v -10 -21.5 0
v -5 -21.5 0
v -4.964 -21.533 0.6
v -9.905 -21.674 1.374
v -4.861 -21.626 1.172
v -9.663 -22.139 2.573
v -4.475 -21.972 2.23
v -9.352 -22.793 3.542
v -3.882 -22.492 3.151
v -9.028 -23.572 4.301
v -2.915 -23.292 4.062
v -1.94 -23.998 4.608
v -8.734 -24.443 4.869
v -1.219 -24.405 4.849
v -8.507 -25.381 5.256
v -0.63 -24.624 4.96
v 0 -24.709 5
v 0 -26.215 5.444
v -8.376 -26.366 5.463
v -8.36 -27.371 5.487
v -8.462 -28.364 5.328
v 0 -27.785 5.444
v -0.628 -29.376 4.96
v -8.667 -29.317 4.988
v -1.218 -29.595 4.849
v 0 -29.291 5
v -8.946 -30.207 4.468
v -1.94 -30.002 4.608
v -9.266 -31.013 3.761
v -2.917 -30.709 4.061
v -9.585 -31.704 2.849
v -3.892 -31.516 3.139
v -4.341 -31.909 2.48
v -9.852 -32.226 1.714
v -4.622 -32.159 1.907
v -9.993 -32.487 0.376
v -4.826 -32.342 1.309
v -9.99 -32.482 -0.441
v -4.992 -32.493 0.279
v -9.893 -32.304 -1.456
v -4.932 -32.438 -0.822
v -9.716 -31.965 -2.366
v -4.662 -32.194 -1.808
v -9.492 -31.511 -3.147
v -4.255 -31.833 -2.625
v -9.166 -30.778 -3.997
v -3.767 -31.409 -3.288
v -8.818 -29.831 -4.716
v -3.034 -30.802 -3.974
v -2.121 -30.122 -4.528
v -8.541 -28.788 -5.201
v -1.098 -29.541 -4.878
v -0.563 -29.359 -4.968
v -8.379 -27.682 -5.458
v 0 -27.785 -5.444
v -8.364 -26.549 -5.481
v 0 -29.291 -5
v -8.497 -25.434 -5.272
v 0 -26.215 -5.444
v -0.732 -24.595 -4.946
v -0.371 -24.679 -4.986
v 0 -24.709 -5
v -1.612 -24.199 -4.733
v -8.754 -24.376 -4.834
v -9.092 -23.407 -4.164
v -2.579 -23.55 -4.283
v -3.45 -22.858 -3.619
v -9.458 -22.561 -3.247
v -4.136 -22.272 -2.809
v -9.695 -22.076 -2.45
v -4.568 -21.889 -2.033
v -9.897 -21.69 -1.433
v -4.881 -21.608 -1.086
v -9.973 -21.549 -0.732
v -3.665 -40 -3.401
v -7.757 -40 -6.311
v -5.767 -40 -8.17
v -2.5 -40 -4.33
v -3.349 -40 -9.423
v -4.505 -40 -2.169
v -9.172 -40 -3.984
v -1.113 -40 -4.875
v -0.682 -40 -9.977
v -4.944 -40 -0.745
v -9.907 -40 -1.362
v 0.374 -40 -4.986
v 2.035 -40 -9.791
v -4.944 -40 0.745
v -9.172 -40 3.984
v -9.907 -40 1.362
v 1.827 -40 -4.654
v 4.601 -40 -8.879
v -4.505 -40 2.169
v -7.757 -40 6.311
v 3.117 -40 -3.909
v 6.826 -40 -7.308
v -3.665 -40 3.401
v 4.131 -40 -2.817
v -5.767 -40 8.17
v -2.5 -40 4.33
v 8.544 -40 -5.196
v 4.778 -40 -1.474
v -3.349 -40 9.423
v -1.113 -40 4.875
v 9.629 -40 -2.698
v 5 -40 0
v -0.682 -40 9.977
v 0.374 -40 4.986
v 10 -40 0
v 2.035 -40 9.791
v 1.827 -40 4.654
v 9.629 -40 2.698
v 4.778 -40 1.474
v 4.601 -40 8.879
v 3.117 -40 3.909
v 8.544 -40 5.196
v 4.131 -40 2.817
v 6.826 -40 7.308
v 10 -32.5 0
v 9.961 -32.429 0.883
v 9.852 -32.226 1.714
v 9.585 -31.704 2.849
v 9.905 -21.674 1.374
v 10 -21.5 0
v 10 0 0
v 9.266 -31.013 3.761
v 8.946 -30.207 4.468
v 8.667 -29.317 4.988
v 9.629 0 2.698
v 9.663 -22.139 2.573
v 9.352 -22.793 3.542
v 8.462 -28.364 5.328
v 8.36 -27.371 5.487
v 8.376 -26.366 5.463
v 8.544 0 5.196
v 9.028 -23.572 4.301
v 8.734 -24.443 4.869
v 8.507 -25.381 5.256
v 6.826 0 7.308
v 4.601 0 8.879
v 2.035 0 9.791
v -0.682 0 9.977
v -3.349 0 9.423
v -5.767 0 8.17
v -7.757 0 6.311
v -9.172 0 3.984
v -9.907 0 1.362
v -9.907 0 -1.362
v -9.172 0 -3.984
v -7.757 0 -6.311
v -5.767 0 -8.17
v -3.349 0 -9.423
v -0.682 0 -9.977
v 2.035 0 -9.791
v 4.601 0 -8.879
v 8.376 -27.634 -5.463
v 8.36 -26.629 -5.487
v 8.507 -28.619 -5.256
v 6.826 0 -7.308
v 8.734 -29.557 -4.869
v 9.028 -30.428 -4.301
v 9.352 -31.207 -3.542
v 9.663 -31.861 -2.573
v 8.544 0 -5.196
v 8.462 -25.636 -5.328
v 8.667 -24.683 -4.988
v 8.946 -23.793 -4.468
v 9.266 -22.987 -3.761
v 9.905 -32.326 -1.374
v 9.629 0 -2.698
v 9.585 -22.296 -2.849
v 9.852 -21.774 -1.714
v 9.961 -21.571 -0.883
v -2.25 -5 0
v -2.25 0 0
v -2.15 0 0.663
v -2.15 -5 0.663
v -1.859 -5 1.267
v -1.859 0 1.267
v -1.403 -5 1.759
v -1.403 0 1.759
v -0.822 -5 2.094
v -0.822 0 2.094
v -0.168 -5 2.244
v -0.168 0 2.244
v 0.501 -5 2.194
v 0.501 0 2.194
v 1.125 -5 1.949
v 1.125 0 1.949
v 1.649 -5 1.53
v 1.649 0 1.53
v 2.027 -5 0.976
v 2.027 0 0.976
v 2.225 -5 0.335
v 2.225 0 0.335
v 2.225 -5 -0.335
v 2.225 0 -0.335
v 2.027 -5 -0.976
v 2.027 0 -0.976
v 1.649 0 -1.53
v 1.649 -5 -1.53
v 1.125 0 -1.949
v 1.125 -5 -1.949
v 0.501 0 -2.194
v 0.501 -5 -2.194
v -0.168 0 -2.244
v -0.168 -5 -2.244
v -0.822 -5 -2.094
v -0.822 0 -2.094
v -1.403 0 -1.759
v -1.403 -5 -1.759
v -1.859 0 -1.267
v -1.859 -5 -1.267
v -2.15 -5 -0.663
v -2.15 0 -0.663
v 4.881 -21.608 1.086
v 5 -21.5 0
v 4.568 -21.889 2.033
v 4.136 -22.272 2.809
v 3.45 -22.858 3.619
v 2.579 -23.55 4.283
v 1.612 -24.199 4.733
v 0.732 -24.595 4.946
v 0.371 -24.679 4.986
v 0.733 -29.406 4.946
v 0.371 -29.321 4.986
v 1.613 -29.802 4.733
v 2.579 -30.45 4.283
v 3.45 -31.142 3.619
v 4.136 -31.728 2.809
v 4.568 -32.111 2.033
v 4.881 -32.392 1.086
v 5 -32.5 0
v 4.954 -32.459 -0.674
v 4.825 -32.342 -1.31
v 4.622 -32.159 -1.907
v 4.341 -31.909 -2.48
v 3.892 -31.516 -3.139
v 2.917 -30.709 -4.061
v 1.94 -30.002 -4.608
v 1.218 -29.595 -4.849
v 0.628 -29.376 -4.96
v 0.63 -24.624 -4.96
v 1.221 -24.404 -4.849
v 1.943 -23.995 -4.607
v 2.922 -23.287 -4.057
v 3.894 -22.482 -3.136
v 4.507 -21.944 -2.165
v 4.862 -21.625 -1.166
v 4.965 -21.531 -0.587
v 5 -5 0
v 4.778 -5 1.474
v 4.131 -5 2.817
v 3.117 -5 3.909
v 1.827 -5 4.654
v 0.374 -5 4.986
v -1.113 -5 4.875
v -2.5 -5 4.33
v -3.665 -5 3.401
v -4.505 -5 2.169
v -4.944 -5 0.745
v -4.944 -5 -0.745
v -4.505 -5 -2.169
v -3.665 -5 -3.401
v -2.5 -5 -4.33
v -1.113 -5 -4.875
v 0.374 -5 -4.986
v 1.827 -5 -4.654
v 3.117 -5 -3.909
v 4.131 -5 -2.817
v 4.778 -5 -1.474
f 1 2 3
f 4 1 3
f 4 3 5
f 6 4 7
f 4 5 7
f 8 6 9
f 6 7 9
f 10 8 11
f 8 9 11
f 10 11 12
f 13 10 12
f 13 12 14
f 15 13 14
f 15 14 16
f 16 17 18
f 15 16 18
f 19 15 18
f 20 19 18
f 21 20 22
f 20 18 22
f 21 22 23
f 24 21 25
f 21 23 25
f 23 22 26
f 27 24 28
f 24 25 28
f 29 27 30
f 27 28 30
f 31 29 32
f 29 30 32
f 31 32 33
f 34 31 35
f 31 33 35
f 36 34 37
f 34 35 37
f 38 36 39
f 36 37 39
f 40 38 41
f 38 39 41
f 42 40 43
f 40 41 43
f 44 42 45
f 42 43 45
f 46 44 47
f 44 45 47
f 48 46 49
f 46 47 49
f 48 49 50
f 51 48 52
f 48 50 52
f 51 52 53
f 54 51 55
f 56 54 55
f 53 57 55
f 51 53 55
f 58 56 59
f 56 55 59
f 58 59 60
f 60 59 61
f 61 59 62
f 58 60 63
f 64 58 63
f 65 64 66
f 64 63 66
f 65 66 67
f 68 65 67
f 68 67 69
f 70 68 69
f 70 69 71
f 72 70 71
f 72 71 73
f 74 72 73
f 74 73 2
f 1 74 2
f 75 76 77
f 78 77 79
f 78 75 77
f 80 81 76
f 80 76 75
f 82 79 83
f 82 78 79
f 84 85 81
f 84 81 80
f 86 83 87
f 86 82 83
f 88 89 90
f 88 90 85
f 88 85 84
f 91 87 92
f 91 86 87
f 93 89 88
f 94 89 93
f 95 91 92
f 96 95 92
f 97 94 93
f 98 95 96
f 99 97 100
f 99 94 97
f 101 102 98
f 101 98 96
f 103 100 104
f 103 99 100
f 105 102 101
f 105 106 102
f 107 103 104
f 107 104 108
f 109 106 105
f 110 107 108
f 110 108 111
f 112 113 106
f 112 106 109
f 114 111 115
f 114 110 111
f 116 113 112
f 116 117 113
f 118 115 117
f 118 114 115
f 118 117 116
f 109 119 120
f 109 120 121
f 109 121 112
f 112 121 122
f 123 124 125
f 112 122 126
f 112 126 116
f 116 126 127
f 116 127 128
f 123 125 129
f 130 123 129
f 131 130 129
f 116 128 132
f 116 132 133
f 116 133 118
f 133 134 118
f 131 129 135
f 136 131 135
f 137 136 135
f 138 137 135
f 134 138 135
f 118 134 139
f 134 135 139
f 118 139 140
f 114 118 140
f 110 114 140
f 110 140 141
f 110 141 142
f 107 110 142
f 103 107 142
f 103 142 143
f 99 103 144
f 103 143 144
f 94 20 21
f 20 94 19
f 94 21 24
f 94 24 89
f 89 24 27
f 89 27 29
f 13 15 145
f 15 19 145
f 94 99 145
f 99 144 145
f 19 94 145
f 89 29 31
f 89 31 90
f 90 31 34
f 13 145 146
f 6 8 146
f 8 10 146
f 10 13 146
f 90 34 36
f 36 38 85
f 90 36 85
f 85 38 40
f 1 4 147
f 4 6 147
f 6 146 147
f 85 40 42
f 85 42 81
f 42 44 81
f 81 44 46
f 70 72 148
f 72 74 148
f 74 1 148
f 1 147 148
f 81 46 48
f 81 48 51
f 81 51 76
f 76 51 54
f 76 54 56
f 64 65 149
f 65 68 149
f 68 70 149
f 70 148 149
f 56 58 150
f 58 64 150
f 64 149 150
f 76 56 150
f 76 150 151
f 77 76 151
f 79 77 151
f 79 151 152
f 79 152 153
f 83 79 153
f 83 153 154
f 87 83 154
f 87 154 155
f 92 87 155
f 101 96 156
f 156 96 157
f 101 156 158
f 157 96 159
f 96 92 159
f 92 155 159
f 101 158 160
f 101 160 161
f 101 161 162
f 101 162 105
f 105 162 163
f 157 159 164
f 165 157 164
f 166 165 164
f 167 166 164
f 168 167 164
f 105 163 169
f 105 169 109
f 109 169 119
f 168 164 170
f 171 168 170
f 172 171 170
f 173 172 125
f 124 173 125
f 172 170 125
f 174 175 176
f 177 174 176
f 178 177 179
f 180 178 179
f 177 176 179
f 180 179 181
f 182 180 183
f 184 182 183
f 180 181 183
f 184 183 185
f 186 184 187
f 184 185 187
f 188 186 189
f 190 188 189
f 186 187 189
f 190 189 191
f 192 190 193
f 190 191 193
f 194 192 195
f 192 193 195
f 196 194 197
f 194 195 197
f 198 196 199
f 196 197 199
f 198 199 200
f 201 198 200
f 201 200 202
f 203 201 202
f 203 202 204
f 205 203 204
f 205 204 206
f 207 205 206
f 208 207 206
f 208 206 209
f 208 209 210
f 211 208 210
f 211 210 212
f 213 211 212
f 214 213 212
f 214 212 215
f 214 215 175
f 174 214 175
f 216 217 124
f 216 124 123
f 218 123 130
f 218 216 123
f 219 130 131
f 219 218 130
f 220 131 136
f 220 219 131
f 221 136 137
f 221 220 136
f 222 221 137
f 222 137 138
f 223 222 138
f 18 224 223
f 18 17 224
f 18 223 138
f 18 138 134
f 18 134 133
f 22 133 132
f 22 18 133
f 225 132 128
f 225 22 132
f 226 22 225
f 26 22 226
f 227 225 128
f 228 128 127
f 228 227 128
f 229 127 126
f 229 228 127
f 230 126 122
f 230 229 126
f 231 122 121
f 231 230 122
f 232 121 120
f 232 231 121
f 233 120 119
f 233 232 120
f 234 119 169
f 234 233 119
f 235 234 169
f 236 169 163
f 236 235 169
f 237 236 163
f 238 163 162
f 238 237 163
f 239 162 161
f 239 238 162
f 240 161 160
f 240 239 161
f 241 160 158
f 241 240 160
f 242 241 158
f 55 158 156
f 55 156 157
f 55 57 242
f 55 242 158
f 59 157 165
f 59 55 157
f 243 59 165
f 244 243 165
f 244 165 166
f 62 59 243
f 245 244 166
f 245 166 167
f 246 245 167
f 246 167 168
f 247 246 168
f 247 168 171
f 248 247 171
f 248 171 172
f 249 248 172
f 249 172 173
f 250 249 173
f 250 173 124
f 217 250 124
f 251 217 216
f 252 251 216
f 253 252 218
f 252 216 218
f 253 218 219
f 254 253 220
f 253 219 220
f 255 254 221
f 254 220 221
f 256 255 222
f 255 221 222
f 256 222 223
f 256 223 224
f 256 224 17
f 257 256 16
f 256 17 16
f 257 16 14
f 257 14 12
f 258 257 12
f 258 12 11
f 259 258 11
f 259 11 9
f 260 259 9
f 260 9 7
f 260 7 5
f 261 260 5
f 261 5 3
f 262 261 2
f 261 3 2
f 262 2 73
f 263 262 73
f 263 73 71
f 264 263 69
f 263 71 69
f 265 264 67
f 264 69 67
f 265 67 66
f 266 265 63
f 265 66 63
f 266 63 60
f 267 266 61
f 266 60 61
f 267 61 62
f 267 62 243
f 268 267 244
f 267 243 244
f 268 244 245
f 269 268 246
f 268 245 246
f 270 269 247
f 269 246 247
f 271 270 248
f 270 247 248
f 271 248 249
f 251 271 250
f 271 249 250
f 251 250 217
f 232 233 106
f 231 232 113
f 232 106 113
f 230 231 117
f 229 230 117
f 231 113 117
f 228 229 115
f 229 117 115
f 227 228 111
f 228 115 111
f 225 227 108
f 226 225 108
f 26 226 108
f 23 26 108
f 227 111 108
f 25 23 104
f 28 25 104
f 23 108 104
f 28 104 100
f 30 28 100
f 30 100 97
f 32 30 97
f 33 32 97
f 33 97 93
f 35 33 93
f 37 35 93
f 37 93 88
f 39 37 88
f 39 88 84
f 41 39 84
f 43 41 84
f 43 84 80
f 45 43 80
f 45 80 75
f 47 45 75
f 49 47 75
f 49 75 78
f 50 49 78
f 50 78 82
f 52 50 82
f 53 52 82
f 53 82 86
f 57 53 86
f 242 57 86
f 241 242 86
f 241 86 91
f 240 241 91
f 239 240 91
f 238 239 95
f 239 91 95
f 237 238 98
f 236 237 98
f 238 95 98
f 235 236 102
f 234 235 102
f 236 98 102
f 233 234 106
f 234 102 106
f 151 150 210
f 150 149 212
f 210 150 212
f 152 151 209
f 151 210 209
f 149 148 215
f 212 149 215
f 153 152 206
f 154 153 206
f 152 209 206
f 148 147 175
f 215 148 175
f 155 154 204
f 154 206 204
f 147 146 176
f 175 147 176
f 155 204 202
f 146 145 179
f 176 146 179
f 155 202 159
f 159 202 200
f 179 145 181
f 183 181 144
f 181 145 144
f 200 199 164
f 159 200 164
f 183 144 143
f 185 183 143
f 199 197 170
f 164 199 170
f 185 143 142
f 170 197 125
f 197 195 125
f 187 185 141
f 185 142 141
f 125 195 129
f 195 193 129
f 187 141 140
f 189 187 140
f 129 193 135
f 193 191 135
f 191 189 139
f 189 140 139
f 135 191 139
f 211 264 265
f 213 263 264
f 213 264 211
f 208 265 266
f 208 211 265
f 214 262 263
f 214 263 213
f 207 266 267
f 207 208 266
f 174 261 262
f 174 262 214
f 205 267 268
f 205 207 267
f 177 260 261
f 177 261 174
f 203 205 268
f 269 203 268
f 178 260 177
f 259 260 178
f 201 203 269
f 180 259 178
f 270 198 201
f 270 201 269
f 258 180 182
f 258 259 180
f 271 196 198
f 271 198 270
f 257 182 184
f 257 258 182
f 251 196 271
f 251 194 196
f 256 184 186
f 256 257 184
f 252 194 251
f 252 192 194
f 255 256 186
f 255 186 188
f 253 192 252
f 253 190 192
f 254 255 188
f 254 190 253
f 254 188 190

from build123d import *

# Parameters (mm, degrees)
F0_R          = 10
F1_DEPTH      = 40
F2_R          = 2.25
F3_DEPTH      = 40
F4_R          = 5
F5_DEPTH      = 35
F6_R          = 5.5
F7_DEPTH      = 10.001
F7_DEPTH_BACK = 10.001


with BuildPart() as f1:
    # F0 (on Front) → F1 (new body)
    with BuildSketch(Plane.XZ):
        Circle(F0_R)
    extrude(amount=F1_DEPTH)

    # F2 (on face) → F3 (cut, through all)
    with BuildSketch(Plane(origin=(0, 0, 0), x_dir=(-1, 0, 0), z_dir=(0, 1, 0))):
        Circle(F2_R)
    extrude(amount=-F3_DEPTH, mode=Mode.SUBTRACT)

    # F4 (on face) → F5 (cut)
    with BuildSketch(Plane.XZ.offset(40)):
        Circle(F4_R)
    extrude(amount=-F5_DEPTH, mode=Mode.SUBTRACT)

    # F6 (on Right) → F7 (cut, two sides)
    with BuildSketch(Plane.YZ) as f7_sk:
        with Locations((-27, 0)):
            Circle(F6_R)
    extrude(amount=-F7_DEPTH, mode=Mode.SUBTRACT)
    extrude(f7_sk.sketch, amount=F7_DEPTH_BACK, mode=Mode.SUBTRACT)


solid = f1.part
